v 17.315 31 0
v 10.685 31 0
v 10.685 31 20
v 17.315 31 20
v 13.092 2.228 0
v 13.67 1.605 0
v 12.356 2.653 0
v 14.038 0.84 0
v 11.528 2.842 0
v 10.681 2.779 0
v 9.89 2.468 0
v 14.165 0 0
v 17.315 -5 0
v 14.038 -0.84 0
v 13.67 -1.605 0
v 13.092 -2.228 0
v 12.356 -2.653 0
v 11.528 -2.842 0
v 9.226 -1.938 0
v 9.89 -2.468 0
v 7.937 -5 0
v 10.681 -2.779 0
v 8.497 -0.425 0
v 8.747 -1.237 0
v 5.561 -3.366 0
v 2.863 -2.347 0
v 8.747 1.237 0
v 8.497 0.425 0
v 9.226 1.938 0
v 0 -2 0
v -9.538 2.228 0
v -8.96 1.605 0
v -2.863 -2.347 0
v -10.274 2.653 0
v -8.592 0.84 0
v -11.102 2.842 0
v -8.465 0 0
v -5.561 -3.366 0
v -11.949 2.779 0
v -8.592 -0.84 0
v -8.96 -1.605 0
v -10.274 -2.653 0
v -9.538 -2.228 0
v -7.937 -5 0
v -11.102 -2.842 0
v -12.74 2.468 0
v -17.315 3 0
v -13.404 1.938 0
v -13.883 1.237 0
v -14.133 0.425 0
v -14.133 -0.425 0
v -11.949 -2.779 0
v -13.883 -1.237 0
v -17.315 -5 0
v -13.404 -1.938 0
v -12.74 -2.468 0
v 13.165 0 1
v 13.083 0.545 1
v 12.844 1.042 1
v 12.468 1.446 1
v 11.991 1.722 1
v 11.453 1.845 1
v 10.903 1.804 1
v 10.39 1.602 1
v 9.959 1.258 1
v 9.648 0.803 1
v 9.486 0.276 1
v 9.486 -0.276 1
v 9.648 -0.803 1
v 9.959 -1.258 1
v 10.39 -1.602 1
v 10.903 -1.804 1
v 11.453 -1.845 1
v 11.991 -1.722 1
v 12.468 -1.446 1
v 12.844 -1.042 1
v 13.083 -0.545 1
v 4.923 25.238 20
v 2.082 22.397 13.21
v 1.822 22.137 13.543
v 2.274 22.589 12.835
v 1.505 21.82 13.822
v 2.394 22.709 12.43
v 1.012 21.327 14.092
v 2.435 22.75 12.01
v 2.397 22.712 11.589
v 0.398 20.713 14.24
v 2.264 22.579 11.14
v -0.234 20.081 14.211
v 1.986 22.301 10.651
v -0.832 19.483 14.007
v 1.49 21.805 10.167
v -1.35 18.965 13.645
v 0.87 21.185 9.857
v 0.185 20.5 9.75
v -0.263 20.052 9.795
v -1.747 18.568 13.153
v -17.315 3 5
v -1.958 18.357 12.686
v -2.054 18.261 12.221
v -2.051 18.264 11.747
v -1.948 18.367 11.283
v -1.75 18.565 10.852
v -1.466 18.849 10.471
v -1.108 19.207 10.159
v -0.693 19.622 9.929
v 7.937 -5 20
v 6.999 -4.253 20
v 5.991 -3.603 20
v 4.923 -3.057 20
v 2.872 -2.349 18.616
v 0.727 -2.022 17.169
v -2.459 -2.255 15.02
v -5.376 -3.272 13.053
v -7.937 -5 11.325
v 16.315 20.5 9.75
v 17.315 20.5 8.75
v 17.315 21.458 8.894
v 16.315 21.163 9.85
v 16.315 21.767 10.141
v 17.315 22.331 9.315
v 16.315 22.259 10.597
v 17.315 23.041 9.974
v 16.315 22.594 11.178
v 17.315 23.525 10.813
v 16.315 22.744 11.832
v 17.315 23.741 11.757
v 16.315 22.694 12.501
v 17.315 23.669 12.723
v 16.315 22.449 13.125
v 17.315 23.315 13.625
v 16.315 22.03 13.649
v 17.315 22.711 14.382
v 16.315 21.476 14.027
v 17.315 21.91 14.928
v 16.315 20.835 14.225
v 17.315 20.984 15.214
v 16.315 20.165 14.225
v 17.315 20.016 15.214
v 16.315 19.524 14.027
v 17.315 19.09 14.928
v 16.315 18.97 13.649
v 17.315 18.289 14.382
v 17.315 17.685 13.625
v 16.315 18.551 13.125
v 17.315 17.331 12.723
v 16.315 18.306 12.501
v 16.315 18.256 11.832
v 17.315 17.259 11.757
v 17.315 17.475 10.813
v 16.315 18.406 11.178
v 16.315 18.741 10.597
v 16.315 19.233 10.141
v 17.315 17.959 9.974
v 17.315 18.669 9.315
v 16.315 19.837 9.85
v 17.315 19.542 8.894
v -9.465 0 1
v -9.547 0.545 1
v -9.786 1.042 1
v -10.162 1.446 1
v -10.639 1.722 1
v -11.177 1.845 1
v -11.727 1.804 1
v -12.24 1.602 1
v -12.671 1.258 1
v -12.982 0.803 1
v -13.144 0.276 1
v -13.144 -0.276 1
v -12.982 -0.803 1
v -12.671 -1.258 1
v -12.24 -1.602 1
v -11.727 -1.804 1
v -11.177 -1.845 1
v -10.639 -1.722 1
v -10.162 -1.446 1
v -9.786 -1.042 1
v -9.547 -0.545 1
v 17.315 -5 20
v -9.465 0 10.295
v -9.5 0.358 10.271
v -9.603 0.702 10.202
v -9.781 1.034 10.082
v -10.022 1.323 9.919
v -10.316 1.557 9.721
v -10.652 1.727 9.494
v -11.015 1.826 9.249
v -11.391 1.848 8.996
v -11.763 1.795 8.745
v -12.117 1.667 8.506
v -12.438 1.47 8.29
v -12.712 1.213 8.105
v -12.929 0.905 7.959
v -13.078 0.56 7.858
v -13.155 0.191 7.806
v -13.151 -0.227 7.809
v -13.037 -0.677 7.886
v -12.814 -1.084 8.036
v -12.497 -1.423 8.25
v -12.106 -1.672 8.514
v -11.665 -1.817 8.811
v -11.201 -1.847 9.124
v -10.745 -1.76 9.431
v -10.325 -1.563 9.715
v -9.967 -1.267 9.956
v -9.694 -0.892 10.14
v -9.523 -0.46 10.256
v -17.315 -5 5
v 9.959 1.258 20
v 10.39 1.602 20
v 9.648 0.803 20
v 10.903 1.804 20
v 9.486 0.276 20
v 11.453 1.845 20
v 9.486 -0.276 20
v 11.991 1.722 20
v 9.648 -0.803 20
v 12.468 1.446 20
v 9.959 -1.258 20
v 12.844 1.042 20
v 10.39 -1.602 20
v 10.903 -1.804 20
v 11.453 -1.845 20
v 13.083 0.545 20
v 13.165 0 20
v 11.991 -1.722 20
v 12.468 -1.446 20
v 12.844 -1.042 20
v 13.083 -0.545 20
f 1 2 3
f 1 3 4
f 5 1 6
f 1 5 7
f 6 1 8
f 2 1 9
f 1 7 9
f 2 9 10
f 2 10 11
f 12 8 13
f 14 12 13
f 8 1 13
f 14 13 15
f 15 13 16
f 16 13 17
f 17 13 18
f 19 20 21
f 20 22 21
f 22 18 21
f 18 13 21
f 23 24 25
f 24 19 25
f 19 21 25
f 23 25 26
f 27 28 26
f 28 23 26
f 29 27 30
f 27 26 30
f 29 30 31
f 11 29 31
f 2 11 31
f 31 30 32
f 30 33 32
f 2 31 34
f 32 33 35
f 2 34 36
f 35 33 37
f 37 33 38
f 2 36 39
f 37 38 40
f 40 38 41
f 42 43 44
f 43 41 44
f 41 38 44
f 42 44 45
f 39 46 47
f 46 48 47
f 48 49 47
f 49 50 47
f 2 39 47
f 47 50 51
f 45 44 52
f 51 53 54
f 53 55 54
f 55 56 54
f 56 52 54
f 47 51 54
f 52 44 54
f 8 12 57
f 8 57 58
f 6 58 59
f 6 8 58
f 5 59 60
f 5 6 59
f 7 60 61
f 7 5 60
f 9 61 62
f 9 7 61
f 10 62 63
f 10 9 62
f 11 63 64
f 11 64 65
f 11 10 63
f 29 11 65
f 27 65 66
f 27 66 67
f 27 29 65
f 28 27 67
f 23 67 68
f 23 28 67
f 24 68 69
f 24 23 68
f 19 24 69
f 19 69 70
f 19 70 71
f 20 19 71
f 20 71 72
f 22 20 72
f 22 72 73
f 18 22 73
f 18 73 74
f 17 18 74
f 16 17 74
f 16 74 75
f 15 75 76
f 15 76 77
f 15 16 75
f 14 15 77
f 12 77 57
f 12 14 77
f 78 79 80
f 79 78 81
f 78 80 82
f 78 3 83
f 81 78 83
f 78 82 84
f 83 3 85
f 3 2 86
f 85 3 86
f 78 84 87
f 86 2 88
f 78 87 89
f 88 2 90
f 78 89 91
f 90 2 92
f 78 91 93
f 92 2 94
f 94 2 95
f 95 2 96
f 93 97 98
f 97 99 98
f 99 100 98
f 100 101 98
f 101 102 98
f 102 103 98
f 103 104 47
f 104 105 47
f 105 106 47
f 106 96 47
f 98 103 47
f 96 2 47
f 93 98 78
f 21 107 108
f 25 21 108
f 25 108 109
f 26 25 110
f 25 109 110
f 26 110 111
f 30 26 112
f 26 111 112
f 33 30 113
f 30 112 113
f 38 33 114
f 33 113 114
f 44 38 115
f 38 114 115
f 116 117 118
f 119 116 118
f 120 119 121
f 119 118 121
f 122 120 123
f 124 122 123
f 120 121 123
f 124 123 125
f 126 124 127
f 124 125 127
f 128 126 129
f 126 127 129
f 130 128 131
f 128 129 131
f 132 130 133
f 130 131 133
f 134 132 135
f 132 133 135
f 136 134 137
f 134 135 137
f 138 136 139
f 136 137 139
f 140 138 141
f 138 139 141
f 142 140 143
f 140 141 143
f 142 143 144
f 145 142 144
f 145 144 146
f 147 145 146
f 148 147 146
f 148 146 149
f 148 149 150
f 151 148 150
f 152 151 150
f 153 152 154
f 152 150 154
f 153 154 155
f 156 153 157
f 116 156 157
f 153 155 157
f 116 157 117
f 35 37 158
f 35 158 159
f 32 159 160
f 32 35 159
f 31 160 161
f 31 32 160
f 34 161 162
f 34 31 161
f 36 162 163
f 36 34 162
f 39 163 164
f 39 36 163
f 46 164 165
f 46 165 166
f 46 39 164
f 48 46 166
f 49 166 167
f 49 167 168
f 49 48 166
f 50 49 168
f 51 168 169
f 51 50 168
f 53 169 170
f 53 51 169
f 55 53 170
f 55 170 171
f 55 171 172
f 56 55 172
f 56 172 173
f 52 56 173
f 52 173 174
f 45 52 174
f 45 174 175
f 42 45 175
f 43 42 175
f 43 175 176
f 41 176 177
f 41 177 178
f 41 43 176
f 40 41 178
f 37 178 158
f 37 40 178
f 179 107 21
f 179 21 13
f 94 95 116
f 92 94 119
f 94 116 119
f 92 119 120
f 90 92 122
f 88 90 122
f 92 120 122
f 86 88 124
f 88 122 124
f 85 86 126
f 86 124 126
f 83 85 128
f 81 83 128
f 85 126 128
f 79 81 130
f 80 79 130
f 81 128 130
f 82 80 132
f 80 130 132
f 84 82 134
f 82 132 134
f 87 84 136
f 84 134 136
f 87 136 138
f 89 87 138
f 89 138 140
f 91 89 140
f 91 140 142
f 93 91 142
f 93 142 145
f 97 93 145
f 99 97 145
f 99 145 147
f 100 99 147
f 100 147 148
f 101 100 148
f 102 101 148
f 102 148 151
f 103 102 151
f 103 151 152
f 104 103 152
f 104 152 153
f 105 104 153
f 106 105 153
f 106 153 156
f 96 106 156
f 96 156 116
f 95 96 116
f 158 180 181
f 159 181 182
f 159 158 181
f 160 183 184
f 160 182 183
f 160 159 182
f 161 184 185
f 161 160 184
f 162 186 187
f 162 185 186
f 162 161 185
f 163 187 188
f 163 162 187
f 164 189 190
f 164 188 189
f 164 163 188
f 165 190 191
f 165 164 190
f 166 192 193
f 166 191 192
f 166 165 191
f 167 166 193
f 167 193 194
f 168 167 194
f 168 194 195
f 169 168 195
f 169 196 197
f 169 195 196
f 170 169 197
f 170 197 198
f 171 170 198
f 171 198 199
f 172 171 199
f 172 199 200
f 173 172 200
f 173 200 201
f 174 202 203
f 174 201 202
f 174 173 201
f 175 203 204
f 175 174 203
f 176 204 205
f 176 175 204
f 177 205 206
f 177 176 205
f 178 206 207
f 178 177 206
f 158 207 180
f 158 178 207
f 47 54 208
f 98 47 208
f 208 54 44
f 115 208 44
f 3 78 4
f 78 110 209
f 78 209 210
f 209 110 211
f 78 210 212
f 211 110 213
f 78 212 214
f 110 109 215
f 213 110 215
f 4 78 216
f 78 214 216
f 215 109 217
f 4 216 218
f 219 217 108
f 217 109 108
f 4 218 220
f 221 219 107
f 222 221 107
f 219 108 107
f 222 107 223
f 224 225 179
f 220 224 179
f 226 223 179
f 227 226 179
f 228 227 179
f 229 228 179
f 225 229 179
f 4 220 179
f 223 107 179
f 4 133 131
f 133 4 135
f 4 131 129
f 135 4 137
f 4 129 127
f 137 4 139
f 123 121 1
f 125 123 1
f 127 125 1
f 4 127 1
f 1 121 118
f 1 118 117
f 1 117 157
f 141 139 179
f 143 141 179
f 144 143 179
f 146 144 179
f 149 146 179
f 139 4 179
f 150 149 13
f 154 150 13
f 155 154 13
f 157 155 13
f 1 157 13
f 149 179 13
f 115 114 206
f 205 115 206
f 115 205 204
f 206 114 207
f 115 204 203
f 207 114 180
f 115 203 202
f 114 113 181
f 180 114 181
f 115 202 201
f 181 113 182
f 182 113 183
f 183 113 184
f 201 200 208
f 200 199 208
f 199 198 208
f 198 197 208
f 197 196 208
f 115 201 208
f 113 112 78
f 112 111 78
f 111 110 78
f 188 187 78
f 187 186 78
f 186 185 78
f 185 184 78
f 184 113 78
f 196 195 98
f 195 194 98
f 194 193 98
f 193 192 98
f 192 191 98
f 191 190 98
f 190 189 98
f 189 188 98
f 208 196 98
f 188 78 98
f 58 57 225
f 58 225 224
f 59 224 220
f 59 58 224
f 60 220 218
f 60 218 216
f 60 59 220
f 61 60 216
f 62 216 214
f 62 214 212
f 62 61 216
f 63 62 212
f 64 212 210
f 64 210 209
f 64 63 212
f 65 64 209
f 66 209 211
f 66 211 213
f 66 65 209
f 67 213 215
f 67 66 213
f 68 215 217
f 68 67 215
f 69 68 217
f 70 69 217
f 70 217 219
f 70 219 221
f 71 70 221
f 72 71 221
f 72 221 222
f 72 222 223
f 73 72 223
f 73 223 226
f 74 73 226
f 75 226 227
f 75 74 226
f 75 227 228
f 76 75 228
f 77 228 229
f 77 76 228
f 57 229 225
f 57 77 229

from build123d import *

# Parameters (mm, degrees)
SKETCH1_W           = 34.63
SKETCH1_H           = 10
SKETCH1_R           = 1.85
BOSS_EXTRUDE1_DEPTH = 20
CHAMFER1_SIZE       = 1
SKETCH2_R           = 12
CUT_EXTRUDE1_DEPTH  = 27.9222812
BOSS_EXTRUDE2_DEPTH = 26
SKETCH5_R           = 2.25
CUT_EXTRUDE3_DEPTH  = 51.598783582
CHAMFER2_SIZE       = 1
CHAMFER3_SIZE       = 28
CHAMFER4_SIZE       = 22.238414528
CHAMFER4_SIZE_2     = 15


with BuildPart() as part:
    # Sketch1 → Boss-Extrude1 (new body)
    with BuildSketch(Plane.XY):
        Rectangle(SKETCH1_W, SKETCH1_H)
        with Locations((-11.315, 0)):
            Circle(SKETCH1_R, mode=Mode.SUBTRACT)
        with Locations((11.315, 0)):
            Circle(SKETCH1_R, mode=Mode.SUBTRACT)
    extrude(amount=BOSS_EXTRUDE1_DEPTH)

    # Chamfer1
    chamfer1_edges = [part.edges().sort_by_distance(p)[0] for p in [
        (-13.165, 0, 0),
        (9.465, 0, 0),
    ]]
    chamfer(chamfer1_edges, length=CHAMFER1_SIZE)

    # Sketch2 → Cut-Extrude1 (cut, through all)
    with BuildSketch(Plane.XY.offset(20)):
        with Locations((0, -14)):
            Circle(SKETCH2_R)
    extrude(amount=-CUT_EXTRUDE1_DEPTH, mode=Mode.SUBTRACT)

    # Sketch3 → Boss-Extrude2 (add)
    with BuildSketch(Plane(origin=(0, 5, 0), x_dir=(1, 0, 0), z_dir=(0, 1, 0))):
        Polygon((-17.315, 0), (-17.315, -20), (11.315, -20), (17.315, -20), (17.315, 0), align=None)
    extrude(amount=BOSS_EXTRUDE2_DEPTH)

    # Sketch5 → Cut-Extrude3 (cut, through all)
    with BuildSketch(Plane(origin=(17.315, 0, 0), x_dir=(0, 0, -1), z_dir=(1, 0, 0))):
        with Locations((-12, 20.5)):
            Circle(SKETCH5_R)
    extrude(amount=-CUT_EXTRUDE3_DEPTH, mode=Mode.SUBTRACT)

    # Chamfer2
    chamfer2_edges = [part.edges().sort_by_distance(p)[0] for p in [
        (17.315, 20.5, 14.25),
    ]]
    chamfer(chamfer2_edges, length=CHAMFER2_SIZE)

    # Chamfer3
    # the kernel refuses this chamfer: 28 mm, written as the material it takes off along each edge
    with BuildSketch(Plane(origin=(-17.315, 31, -72.007123663), x_dir=(0.9996219169112968, 0.027495876610586365, 0), z_dir=(0, 0, 1))) as chamfer3_piece_1:
        Polygon((CHAMFER3_SIZE * 0.999621916911, -CHAMFER3_SIZE * 0.0274958766106), (-CHAMFER3_SIZE * 0.0274958766106, -CHAMFER3_SIZE * 0.999621916911), (0, 0), align=None)
    extrude(amount=164.014247326, mode=Mode.SUBTRACT)

    # Chamfer4
    # the kernel refuses this chamfer: 22.238414528, 15 mm, written as the material it takes off along each edge
    with BuildSketch(Plane(origin=(-17.315, 60.453144221, 20), x_dir=(0.9997657259302418, 0, 0.021644705014774085), z_dir=(0, -1, 0))) as chamfer4_piece_1:
        Polygon((CHAMFER4_SIZE * 0.999765725916, -CHAMFER4_SIZE * 0.0216447050145), (-CHAMFER4_SIZE_2 * 0.0216447050148, -CHAMFER4_SIZE_2 * 0.99976572593), (0, 0), align=None)
    extrude(amount=122.906288442, mode=Mode.SUBTRACT)


solid = part.part
